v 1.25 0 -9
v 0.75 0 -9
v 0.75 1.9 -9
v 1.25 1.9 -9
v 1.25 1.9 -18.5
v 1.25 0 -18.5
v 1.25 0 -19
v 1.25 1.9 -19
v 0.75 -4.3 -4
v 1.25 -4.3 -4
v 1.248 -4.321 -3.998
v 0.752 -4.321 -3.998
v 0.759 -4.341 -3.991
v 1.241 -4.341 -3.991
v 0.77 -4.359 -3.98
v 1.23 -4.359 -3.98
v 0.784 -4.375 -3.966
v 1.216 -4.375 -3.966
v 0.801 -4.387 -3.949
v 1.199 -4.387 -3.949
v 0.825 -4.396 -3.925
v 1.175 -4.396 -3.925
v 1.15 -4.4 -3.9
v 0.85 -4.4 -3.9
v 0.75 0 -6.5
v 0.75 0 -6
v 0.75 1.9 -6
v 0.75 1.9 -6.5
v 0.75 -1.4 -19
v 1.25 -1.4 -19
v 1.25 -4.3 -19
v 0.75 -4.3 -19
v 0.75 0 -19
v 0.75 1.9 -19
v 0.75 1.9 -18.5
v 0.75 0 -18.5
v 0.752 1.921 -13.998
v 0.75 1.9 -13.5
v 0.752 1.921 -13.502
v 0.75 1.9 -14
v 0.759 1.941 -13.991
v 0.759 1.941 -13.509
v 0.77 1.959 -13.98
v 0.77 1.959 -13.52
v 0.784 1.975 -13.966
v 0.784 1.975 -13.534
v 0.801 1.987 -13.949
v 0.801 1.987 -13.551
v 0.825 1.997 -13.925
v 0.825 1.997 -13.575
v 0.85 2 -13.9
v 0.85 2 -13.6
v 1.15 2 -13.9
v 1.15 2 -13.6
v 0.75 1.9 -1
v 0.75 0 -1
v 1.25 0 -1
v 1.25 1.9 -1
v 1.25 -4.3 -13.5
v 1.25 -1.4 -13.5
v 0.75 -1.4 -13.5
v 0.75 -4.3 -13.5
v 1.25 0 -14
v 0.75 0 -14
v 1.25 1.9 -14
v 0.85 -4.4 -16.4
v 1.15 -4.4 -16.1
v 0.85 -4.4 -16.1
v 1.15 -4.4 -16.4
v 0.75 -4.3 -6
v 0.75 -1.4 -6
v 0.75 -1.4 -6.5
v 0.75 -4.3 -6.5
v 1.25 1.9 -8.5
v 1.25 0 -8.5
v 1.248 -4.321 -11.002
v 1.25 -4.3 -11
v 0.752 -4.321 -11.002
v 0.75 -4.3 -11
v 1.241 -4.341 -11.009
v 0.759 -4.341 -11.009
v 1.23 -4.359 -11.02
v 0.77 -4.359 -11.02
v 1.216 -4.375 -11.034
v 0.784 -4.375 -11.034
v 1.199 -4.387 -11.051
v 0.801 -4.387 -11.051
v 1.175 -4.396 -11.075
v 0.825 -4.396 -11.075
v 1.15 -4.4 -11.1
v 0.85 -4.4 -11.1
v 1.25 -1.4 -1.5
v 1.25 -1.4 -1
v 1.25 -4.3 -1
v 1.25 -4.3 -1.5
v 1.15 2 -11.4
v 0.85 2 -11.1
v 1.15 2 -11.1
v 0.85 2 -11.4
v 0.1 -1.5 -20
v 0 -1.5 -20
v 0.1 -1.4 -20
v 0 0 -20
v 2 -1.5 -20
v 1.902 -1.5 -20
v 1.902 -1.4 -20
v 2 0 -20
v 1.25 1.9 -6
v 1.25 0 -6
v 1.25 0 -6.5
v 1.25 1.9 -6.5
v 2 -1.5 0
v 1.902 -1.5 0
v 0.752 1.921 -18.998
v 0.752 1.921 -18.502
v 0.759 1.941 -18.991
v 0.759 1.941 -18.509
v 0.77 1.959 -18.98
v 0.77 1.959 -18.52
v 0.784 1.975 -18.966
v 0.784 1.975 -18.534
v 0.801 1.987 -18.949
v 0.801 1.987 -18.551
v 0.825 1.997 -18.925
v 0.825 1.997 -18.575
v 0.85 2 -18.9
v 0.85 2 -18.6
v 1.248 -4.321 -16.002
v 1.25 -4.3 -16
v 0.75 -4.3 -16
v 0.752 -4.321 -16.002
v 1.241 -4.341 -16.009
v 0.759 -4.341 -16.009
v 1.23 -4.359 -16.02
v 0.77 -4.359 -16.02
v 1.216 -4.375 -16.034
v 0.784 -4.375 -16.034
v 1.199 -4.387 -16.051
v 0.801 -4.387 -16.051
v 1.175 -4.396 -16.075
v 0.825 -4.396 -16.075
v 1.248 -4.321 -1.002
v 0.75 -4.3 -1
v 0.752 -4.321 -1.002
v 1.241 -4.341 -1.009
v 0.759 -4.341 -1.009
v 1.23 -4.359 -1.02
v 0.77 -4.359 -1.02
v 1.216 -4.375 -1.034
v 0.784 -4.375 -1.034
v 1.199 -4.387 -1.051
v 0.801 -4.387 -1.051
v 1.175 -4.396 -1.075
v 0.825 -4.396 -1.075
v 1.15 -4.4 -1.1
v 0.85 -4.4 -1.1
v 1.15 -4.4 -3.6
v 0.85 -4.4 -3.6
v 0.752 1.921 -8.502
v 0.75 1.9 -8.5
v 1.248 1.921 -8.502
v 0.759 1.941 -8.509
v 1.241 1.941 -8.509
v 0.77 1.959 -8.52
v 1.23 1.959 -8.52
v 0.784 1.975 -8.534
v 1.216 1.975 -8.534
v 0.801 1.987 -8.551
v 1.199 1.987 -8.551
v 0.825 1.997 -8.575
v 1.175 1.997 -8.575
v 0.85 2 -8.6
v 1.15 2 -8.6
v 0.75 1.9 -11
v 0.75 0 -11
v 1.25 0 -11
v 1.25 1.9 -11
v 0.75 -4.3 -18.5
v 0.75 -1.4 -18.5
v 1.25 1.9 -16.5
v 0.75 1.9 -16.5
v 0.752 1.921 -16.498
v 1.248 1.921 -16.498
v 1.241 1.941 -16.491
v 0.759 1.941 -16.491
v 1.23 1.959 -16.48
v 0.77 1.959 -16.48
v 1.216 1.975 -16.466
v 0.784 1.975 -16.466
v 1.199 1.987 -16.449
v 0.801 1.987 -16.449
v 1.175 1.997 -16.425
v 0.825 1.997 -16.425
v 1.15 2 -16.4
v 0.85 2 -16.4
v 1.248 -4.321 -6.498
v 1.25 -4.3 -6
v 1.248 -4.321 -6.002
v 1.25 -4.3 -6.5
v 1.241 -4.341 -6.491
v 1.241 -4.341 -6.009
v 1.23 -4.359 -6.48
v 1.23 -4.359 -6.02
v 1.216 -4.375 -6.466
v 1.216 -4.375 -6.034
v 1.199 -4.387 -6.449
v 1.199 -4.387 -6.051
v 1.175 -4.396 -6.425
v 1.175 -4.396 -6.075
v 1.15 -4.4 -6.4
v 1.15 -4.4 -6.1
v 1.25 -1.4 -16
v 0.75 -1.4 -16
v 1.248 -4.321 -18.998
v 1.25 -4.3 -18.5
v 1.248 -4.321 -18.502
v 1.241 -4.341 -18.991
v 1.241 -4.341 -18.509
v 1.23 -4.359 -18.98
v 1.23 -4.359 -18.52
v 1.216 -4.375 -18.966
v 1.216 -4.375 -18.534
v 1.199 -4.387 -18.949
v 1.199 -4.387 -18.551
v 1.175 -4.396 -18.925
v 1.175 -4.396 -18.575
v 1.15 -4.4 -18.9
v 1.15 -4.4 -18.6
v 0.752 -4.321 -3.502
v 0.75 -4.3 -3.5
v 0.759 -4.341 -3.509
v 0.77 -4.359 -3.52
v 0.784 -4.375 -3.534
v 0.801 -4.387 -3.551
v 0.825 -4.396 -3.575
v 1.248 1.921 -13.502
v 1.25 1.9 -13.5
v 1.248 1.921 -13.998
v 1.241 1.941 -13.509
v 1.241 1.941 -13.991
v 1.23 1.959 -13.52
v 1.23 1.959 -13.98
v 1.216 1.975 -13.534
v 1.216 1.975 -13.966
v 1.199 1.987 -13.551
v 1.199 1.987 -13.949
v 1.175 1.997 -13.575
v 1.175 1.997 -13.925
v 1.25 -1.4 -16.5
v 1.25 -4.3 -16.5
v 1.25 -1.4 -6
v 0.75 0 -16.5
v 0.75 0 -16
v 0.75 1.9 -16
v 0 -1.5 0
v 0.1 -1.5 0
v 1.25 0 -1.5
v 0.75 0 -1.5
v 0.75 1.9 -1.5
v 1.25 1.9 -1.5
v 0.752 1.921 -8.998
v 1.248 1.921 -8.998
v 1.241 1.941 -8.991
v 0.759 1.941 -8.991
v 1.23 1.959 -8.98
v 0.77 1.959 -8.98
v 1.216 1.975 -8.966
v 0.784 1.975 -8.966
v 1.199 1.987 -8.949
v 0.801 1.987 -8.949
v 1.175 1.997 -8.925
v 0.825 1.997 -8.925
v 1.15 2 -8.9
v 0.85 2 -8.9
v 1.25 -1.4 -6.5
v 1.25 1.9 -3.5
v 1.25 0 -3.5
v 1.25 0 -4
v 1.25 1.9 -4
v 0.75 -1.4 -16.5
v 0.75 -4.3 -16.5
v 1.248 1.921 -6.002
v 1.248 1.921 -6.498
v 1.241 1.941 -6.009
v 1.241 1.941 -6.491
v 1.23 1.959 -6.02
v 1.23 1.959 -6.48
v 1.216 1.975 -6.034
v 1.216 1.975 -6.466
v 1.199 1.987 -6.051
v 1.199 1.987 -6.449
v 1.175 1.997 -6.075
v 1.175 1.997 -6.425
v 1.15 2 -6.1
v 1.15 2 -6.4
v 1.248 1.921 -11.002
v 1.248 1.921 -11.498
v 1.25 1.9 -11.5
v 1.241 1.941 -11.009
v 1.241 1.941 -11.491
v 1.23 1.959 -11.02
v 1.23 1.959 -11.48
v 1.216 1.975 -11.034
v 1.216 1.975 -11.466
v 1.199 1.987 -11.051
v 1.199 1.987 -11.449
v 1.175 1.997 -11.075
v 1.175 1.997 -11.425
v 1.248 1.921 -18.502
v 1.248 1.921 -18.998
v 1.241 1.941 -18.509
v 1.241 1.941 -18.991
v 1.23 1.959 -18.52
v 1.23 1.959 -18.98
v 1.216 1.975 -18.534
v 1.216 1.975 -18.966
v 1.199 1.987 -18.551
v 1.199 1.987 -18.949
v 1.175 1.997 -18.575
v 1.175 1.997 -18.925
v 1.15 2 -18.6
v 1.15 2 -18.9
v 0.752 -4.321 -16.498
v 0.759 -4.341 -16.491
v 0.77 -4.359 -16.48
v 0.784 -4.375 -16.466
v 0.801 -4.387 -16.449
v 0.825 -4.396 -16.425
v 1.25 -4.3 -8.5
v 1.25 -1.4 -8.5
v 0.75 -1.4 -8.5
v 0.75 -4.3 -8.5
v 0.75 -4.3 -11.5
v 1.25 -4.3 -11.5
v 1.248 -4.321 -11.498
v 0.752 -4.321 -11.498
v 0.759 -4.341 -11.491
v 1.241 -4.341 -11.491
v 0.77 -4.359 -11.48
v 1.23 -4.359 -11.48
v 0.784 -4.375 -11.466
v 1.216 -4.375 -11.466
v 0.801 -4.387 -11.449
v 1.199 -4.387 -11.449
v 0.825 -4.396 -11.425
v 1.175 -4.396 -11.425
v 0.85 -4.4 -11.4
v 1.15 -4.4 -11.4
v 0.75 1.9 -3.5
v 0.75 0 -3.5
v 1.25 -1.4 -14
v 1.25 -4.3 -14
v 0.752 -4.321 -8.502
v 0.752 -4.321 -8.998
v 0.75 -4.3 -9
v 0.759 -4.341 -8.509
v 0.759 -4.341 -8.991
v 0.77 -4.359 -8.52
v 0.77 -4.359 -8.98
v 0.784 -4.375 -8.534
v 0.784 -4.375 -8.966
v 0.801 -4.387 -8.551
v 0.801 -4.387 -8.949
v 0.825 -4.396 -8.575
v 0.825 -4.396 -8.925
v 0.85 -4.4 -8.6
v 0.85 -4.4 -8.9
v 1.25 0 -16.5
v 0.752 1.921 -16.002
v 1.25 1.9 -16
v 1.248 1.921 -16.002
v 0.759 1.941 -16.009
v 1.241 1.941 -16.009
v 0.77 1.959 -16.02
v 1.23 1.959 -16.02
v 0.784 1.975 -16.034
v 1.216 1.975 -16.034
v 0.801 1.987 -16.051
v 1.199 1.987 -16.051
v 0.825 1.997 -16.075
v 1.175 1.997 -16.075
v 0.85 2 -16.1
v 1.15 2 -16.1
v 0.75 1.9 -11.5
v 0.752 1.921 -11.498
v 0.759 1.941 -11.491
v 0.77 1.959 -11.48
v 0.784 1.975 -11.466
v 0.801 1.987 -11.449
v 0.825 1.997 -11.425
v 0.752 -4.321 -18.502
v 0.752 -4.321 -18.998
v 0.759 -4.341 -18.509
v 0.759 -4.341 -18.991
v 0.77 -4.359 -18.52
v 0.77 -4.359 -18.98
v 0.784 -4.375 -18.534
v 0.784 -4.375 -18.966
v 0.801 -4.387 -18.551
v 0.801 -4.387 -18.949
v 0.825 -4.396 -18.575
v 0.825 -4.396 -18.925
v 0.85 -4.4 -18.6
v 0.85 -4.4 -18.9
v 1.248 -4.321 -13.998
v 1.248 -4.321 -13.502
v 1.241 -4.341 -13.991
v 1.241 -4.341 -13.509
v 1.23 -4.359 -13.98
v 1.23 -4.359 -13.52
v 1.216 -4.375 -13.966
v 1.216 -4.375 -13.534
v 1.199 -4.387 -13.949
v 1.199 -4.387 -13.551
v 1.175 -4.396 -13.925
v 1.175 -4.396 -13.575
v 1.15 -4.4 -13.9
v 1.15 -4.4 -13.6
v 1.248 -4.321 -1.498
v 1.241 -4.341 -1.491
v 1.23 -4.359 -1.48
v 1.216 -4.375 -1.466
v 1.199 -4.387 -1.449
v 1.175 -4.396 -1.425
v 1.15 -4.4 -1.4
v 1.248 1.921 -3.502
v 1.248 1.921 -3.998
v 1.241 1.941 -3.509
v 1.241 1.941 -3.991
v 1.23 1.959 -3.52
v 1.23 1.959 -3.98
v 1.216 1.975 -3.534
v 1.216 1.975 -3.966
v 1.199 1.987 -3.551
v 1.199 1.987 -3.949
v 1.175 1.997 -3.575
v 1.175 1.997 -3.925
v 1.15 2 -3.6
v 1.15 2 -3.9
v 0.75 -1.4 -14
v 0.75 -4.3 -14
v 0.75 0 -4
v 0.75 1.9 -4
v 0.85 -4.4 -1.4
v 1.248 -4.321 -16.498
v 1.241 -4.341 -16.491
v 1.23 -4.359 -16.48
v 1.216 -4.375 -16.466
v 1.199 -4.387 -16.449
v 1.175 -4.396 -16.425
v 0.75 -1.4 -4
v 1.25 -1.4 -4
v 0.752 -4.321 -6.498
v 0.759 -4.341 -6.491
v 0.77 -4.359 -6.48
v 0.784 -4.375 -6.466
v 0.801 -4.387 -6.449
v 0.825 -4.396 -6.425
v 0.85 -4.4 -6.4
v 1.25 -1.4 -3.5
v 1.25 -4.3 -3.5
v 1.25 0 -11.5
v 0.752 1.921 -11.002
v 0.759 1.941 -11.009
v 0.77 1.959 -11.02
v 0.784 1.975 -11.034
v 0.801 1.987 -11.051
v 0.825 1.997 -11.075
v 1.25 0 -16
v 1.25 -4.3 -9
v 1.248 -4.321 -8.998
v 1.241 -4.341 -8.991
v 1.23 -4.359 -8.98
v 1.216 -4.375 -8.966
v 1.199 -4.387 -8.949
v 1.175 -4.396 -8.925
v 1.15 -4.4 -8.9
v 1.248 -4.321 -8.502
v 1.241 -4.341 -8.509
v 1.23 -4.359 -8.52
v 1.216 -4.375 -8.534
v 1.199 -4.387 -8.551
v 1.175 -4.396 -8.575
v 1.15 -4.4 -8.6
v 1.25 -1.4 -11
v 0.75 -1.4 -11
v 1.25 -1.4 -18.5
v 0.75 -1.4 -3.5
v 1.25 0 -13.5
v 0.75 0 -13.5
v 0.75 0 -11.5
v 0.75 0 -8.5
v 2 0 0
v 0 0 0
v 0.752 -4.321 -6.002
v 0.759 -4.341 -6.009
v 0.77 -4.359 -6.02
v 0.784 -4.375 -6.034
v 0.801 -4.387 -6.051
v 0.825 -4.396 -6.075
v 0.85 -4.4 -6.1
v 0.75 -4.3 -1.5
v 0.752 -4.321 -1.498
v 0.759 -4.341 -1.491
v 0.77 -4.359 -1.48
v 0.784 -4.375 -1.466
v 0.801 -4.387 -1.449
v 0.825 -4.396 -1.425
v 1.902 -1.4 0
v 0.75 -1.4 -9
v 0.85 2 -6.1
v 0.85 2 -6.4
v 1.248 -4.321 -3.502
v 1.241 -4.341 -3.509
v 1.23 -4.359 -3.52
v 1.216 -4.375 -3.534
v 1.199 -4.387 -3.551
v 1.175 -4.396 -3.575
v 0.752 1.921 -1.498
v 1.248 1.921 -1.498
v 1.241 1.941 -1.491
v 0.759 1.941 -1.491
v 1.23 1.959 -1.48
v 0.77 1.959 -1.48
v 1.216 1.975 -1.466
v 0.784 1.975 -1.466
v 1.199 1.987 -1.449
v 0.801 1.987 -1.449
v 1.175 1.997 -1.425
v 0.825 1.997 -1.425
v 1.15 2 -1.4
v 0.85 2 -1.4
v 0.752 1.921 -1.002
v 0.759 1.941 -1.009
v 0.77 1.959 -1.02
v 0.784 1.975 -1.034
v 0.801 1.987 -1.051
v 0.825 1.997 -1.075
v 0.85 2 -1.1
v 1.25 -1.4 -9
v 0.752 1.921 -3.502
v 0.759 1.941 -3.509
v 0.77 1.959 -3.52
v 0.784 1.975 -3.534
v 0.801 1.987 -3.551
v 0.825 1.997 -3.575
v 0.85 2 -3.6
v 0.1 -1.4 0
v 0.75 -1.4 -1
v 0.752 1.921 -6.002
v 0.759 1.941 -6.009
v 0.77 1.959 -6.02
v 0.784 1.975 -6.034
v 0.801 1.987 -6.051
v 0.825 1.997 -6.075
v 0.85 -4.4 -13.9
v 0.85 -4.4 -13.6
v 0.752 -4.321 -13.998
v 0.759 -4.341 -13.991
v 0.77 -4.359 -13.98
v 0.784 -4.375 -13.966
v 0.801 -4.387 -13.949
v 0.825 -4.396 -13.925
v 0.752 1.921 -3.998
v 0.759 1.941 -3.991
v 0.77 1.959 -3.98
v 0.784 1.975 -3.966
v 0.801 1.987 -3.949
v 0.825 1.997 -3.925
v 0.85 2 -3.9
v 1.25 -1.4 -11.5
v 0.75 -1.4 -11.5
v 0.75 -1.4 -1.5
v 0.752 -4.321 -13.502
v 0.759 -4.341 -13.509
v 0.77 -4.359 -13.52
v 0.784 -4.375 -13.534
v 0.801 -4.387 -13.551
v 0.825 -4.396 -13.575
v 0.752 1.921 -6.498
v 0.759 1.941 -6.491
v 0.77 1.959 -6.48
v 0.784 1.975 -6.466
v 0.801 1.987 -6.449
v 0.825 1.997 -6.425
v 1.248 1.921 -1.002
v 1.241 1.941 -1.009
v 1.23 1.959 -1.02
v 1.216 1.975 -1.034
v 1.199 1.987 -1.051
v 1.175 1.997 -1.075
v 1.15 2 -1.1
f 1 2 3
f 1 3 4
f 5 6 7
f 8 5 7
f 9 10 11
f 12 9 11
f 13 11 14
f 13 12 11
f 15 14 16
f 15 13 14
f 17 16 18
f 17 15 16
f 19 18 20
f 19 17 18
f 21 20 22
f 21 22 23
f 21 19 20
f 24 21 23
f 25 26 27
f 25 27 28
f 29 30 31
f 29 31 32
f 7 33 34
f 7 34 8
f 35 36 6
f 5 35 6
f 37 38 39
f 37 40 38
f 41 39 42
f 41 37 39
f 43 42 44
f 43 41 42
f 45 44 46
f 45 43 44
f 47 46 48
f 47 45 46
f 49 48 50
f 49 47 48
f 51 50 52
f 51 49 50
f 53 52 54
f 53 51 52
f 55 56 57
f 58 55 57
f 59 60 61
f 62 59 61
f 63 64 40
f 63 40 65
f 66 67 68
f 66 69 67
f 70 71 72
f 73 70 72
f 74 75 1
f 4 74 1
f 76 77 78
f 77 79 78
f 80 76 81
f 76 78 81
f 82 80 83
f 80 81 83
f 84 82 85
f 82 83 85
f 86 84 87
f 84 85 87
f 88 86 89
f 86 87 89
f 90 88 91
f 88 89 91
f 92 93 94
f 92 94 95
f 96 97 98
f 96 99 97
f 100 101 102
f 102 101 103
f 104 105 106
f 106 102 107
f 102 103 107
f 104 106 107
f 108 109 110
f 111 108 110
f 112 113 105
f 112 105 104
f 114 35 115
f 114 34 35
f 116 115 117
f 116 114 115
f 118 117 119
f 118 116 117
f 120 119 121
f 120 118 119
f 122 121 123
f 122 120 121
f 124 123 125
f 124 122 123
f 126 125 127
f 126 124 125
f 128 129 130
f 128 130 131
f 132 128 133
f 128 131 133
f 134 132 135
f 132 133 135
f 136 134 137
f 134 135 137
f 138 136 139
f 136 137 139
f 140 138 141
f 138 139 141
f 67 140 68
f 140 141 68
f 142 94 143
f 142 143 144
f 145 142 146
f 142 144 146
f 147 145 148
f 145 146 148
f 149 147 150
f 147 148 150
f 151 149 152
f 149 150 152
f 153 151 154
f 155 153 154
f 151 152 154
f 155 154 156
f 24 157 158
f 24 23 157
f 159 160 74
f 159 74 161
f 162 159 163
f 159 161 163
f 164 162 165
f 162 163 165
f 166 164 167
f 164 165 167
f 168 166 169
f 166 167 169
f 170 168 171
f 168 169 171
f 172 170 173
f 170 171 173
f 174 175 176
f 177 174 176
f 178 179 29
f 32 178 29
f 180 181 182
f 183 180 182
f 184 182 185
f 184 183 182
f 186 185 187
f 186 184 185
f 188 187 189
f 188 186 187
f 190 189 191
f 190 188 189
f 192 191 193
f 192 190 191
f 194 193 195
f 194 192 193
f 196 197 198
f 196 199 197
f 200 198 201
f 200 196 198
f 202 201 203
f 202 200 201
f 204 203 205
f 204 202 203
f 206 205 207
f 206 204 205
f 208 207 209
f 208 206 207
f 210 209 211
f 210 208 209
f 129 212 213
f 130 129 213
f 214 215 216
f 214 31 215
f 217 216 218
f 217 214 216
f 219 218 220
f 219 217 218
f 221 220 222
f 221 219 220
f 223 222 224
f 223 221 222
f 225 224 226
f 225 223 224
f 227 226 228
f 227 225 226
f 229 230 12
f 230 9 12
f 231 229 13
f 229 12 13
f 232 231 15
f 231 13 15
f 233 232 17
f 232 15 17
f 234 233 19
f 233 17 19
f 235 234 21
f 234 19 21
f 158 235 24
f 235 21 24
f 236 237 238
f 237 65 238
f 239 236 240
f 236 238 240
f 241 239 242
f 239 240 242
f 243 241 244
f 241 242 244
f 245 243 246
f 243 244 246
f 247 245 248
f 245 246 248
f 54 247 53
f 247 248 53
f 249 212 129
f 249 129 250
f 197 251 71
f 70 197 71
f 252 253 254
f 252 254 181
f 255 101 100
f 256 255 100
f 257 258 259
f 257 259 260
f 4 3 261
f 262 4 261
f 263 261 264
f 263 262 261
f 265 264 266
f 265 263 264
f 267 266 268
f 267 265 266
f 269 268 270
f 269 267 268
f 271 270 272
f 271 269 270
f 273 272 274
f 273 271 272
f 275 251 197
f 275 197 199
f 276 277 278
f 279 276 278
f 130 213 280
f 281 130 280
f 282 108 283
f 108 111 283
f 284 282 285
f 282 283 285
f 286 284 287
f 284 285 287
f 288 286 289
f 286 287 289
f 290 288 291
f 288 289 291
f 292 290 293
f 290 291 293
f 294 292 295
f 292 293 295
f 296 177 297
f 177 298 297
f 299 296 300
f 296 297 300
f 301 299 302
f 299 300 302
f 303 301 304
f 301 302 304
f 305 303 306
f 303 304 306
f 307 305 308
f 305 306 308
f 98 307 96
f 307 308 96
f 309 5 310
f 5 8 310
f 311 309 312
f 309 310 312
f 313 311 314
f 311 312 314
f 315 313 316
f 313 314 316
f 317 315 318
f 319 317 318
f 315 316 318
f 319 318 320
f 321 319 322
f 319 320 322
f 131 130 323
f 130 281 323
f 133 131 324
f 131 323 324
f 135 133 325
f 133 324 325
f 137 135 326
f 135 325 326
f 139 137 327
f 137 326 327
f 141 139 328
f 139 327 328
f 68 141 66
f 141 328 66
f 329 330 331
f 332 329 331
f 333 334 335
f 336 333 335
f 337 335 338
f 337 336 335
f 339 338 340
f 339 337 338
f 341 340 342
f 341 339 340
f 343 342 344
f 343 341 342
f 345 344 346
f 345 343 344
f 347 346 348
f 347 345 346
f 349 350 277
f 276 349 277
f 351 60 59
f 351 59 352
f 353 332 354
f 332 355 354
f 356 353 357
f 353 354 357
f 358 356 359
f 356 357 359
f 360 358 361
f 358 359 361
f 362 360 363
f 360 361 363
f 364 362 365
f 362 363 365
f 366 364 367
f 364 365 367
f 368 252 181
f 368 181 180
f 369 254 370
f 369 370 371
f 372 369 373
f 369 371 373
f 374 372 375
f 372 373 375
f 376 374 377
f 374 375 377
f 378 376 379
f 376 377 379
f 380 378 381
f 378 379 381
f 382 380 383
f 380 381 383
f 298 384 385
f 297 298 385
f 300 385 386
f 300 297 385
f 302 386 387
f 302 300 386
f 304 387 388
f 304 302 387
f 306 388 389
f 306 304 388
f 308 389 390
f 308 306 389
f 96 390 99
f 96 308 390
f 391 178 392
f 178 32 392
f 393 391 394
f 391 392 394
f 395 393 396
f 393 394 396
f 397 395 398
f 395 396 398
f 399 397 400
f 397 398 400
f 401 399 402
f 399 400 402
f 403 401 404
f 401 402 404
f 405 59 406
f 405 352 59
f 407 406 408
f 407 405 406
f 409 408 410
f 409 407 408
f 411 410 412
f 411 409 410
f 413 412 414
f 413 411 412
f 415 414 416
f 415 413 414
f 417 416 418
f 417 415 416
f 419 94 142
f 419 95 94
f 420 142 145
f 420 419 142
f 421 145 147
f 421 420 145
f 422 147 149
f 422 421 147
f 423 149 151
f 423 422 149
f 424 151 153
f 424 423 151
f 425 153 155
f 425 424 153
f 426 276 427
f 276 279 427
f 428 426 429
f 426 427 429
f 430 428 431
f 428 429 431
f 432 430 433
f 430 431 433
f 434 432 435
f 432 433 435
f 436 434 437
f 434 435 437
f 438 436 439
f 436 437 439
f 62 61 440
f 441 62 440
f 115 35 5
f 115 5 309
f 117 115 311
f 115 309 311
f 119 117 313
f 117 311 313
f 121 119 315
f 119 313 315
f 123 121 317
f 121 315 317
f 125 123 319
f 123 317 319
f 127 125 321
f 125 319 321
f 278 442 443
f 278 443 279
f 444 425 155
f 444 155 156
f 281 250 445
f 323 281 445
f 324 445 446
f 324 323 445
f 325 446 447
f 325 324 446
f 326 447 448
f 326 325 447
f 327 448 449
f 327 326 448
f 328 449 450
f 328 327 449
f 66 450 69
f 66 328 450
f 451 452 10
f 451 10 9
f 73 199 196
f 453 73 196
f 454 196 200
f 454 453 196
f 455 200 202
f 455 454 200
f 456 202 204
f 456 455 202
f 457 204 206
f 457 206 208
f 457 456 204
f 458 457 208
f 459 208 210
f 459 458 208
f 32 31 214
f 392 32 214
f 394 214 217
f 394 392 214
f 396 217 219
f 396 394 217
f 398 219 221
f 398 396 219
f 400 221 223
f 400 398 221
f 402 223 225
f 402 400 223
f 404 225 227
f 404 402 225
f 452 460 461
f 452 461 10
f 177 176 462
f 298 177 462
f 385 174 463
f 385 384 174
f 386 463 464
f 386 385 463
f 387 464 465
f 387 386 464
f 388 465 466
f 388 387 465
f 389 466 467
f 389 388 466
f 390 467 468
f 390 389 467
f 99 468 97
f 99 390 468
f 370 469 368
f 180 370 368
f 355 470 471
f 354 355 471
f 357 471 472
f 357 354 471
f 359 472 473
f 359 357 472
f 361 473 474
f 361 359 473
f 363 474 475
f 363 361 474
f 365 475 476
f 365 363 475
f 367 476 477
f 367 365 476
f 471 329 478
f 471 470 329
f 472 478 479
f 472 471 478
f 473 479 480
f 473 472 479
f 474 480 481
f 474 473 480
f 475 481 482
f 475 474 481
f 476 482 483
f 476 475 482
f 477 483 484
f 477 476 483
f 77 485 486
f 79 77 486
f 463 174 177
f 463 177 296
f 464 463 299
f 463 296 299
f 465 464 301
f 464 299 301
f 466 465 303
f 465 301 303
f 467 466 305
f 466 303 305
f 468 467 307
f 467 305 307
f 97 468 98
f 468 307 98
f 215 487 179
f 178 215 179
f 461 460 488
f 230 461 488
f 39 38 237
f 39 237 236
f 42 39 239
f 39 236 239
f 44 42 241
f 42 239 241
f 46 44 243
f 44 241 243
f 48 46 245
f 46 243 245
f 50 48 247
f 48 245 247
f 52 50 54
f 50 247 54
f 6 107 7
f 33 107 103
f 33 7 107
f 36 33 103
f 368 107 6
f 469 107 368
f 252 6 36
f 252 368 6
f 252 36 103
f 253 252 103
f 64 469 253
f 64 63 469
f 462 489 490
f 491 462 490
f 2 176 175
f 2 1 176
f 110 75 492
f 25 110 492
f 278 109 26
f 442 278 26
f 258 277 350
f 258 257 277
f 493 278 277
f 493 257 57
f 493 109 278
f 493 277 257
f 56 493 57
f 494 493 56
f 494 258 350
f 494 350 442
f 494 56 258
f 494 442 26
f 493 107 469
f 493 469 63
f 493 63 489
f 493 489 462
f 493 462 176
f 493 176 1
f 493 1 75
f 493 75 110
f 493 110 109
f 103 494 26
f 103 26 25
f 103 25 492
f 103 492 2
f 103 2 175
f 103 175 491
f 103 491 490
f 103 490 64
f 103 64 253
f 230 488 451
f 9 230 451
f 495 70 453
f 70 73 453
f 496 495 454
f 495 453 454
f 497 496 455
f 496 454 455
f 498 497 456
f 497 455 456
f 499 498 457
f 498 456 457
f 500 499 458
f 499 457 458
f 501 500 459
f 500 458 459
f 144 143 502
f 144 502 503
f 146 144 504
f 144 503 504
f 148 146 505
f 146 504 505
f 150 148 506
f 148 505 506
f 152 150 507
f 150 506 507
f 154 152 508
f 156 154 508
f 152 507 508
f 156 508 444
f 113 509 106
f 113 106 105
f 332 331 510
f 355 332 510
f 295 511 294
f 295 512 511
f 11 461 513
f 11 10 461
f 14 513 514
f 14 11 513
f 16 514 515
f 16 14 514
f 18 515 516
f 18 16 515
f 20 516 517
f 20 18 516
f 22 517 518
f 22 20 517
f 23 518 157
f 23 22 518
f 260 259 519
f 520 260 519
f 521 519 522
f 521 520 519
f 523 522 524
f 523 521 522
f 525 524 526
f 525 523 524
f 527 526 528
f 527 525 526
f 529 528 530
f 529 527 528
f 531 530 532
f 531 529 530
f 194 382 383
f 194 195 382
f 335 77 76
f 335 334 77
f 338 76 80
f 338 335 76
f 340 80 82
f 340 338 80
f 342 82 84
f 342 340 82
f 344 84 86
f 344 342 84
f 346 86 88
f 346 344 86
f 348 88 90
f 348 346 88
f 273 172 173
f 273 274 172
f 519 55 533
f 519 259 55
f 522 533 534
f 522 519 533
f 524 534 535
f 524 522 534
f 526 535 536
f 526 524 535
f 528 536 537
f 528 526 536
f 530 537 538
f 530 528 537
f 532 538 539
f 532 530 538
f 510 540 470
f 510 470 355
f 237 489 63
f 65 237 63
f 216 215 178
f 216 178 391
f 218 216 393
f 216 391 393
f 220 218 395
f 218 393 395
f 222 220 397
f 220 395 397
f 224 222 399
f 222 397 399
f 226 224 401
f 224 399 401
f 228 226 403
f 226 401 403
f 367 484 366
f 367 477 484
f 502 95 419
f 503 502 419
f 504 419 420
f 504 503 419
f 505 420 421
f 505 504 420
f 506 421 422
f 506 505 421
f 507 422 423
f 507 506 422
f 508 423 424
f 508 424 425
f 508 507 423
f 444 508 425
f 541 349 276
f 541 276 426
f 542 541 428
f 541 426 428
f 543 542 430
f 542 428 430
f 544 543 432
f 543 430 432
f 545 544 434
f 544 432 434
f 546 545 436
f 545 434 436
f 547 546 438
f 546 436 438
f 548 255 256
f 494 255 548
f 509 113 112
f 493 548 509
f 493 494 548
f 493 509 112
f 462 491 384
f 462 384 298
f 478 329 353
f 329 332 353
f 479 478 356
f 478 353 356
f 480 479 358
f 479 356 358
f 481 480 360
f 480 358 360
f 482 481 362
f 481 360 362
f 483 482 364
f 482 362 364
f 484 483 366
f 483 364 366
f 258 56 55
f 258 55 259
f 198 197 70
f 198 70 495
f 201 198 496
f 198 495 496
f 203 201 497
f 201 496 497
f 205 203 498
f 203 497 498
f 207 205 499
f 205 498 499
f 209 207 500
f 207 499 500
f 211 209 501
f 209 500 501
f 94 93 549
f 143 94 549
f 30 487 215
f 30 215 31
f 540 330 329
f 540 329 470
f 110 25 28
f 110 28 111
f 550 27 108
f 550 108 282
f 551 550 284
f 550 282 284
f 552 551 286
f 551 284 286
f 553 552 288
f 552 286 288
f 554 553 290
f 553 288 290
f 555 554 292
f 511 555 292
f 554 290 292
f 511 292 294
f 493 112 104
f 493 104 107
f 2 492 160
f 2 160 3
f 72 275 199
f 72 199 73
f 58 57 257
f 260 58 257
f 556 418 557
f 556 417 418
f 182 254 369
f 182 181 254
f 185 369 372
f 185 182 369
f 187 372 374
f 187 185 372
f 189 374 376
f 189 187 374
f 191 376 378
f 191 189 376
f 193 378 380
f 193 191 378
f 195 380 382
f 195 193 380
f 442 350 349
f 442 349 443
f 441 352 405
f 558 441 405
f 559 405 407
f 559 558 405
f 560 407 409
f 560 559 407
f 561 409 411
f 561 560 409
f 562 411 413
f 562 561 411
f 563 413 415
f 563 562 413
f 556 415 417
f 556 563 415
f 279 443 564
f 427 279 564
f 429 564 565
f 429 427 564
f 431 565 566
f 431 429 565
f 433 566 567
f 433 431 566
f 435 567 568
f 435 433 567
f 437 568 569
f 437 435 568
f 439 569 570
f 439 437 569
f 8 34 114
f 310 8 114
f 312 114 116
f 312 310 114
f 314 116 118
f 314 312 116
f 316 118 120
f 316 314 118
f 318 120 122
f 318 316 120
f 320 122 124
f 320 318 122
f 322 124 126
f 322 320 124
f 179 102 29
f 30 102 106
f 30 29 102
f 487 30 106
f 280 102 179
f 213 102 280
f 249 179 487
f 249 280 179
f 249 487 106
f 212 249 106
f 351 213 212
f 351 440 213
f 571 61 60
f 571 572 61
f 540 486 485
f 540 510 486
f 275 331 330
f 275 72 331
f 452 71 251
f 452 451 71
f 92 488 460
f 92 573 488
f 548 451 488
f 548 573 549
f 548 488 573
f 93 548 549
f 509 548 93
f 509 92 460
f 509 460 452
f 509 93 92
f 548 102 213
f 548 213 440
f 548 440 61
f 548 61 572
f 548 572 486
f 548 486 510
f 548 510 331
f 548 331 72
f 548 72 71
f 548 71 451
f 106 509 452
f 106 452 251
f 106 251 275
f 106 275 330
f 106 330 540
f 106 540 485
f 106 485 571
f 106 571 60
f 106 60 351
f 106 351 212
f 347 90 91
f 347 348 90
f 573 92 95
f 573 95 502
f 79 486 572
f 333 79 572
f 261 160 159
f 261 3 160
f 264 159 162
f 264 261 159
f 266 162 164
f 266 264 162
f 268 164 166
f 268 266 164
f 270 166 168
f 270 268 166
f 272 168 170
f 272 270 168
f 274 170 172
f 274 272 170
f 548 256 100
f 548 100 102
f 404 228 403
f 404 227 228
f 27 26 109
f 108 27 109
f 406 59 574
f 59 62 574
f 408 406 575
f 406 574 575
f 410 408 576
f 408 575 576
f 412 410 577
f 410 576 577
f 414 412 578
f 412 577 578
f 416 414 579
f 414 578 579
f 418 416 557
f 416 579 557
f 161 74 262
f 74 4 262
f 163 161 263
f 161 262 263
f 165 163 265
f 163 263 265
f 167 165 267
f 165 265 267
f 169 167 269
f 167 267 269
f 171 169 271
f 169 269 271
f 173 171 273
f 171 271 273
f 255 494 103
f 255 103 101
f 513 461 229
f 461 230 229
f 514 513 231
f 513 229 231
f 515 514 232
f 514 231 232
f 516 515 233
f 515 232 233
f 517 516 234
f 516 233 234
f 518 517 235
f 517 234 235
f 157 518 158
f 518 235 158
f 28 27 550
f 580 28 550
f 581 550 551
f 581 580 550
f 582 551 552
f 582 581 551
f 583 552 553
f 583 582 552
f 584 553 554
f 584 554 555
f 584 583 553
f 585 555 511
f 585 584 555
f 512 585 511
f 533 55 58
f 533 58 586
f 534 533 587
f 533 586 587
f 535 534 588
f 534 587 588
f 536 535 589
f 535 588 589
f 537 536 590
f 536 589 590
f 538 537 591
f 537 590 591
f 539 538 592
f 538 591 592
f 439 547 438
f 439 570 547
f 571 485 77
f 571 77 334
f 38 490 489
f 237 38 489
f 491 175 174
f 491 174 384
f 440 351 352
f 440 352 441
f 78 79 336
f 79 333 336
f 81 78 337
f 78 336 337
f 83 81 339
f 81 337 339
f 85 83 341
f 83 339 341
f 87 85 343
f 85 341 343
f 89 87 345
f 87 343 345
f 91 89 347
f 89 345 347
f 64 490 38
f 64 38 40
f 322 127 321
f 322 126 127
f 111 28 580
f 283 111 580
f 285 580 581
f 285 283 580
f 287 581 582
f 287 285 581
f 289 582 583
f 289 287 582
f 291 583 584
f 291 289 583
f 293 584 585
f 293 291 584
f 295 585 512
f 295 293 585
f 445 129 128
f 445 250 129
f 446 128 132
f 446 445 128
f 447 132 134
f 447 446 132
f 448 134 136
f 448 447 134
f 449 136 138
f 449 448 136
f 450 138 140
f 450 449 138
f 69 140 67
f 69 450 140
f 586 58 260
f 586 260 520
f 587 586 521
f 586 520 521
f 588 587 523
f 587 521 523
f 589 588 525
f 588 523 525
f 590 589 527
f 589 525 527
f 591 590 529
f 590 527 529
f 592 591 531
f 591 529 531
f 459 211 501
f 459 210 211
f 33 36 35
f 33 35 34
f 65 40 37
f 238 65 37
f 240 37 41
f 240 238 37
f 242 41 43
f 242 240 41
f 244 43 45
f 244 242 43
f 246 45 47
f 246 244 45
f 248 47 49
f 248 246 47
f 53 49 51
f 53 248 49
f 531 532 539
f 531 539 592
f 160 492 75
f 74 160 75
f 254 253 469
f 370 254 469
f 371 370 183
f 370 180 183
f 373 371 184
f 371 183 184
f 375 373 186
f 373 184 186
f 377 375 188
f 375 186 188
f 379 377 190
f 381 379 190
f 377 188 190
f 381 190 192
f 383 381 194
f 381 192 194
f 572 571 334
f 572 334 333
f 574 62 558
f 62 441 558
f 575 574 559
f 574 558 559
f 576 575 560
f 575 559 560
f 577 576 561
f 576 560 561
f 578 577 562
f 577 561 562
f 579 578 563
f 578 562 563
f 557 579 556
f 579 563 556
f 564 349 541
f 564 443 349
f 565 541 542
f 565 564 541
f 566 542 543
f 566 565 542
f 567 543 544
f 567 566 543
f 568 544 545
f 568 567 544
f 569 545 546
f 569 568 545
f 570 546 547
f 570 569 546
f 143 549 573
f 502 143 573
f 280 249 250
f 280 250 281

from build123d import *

# Parameters (mm, degrees)
BOSS_EXTRUDE1_DEPTH = 20
SKETCH2_W           = 0.5
SKETCH2_H           = 0.5
BOSS_EXTRUDE2_DEPTH = 2
SKETCH3_W           = 0.5
SKETCH3_H           = 0.5
BOSS_EXTRUDE3_DEPTH = 3
FILLET2_R           = 0.1


with BuildPart() as part:
    # Sketch1 → Boss-Extrude1 (new body)
    with BuildSketch(Plane.XY):
        Polygon((0.1, -1.5), (0.1, -1.399682434), (1.901861327, -1.399682434), (1.901861327, -1.5), (2, -1.5), (2, 0), (0, 0), (0, -1.5), align=None)
    extrude(amount=-BOSS_EXTRUDE1_DEPTH)

    # Sketch2 → Boss-Extrude2 (add)
    with BuildSketch(Plane(origin=(0, 0, 0), x_dir=(1, 0, 0), z_dir=(0, 1, 0))):
        with Locations((1, 3.75)):
            Rectangle(SKETCH2_W, SKETCH2_H)
        with Locations((1, 1.25)):
            Rectangle(SKETCH2_W, SKETCH2_H)
        with Locations((1, 6.25)):
            Rectangle(SKETCH2_W, SKETCH2_H)
        with Locations((1, 8.75)):
            Rectangle(SKETCH2_W, SKETCH2_H)
        with Locations((1, 11.25)):
            Rectangle(SKETCH2_W, SKETCH2_H)
        with Locations((1, 13.75)):
            Rectangle(SKETCH2_W, SKETCH2_H)
        with Locations((1, 16.25)):
            Rectangle(SKETCH2_W, SKETCH2_H)
        with Locations((1, 18.75)):
            Rectangle(SKETCH2_W, SKETCH2_H)
    extrude(amount=BOSS_EXTRUDE2_DEPTH)

    # Sketch3 → Boss-Extrude3 (add)
    with BuildSketch(Plane(origin=(0, -1.399682434, 0), x_dir=(-1, 0, 0), z_dir=(0, -1, 0))):
        with Locations((-1, 1.25)):
            Rectangle(SKETCH3_W, SKETCH3_H)
        with Locations((-1, 3.75)):
            Rectangle(SKETCH3_W, SKETCH3_H)
        with Locations((-1, 6.25)):
            Rectangle(SKETCH3_W, SKETCH3_H)
        with Locations((-1, 8.75)):
            Rectangle(SKETCH3_W, SKETCH3_H)
        with Locations((-1, 11.25)):
            Rectangle(SKETCH3_W, SKETCH3_H)
        with Locations((-1, 13.75)):
            Rectangle(SKETCH3_W, SKETCH3_H)
        with Locations((-1, 16.25)):
            Rectangle(SKETCH3_W, SKETCH3_H)
        with Locations((-1, 18.75)):
            Rectangle(SKETCH3_W, SKETCH3_H)
    extrude(amount=BOSS_EXTRUDE3_DEPTH)

    # Fillet2
    fillet2_edges = [part.edges().sort_by_distance(p)[0] for p in [
        (1, 2, -18.5),
        (1.25, 2, -18.75),
        (1, 2, -19),
        (0.75, 2, -18.75),
        (0.75, -4.399682434, -1.25),
        (1, -4.399682434, -1.5),
        (1.25, -4.399682434, -1.25),
        (1, -4.399682434, -1),
        (1, -4.399682434, -3.5),
        (0.75, -4.399682434, -3.75),
        (1, -4.399682434, -4),
        (1.25, -4.399682434, -3.75),
        (1, -4.399682434, -6),
        (0.75, -4.399682434, -6.25),
        (1, -4.399682434, -6.5),
        (1.25, -4.399682434, -6.25),
        (1, -4.399682434, -8.5),
        (0.75, -4.399682434, -8.75),
        (1, -4.399682434, -9),
        (1.25, -4.399682434, -8.75),
        (1, -4.399682434, -11),
        (0.75, -4.399682434, -11.25),
        (1, -4.399682434, -11.5),
        (1.25, -4.399682434, -11.25),
        (1, -4.399682434, -13.5),
        (0.75, -4.399682434, -13.75),
        (1, -4.399682434, -14),
        (1.25, -4.399682434, -13.75),
        (1, -4.399682434, -16),
        (0.75, -4.399682434, -16.25),
        (1, -4.399682434, -16.5),
        (1.25, -4.399682434, -16.25),
        (1, -4.399682434, -18.5),
        (0.75, -4.399682434, -18.75),
        (1, -4.399682434, -19),
        (1.25, -4.399682434, -18.75),
        (1.25, 2, -1.25),
        (1, 2, -1.5),
        (0.75, 2, -1.25),
        (1, 2, -1),
        (1, 2, -3.5),
        (1.25, 2, -3.75),
        (1, 2, -4),
        (0.75, 2, -3.75),
        (1, 2, -6),
        (1.25, 2, -6.25),
        (1, 2, -6.5),
        (0.75, 2, -6.25),
        (1, 2, -8.5),
        (1.25, 2, -8.75),
        (1, 2, -9),
        (0.75, 2, -8.75),
        (1, 2, -11),
        (1.25, 2, -11.25),
        (1, 2, -11.5),
        (0.75, 2, -11.25),
        (1, 2, -13.5),
        (1.25, 2, -13.75),
        (1, 2, -14),
        (0.75, 2, -13.75),
        (1, 2, -16),
        (1.25, 2, -16.25),
        (1, 2, -16.5),
        (0.75, 2, -16.25),
    ]]
    fillet(fillet2_edges, radius=FILLET2_R)


solid = part.part
